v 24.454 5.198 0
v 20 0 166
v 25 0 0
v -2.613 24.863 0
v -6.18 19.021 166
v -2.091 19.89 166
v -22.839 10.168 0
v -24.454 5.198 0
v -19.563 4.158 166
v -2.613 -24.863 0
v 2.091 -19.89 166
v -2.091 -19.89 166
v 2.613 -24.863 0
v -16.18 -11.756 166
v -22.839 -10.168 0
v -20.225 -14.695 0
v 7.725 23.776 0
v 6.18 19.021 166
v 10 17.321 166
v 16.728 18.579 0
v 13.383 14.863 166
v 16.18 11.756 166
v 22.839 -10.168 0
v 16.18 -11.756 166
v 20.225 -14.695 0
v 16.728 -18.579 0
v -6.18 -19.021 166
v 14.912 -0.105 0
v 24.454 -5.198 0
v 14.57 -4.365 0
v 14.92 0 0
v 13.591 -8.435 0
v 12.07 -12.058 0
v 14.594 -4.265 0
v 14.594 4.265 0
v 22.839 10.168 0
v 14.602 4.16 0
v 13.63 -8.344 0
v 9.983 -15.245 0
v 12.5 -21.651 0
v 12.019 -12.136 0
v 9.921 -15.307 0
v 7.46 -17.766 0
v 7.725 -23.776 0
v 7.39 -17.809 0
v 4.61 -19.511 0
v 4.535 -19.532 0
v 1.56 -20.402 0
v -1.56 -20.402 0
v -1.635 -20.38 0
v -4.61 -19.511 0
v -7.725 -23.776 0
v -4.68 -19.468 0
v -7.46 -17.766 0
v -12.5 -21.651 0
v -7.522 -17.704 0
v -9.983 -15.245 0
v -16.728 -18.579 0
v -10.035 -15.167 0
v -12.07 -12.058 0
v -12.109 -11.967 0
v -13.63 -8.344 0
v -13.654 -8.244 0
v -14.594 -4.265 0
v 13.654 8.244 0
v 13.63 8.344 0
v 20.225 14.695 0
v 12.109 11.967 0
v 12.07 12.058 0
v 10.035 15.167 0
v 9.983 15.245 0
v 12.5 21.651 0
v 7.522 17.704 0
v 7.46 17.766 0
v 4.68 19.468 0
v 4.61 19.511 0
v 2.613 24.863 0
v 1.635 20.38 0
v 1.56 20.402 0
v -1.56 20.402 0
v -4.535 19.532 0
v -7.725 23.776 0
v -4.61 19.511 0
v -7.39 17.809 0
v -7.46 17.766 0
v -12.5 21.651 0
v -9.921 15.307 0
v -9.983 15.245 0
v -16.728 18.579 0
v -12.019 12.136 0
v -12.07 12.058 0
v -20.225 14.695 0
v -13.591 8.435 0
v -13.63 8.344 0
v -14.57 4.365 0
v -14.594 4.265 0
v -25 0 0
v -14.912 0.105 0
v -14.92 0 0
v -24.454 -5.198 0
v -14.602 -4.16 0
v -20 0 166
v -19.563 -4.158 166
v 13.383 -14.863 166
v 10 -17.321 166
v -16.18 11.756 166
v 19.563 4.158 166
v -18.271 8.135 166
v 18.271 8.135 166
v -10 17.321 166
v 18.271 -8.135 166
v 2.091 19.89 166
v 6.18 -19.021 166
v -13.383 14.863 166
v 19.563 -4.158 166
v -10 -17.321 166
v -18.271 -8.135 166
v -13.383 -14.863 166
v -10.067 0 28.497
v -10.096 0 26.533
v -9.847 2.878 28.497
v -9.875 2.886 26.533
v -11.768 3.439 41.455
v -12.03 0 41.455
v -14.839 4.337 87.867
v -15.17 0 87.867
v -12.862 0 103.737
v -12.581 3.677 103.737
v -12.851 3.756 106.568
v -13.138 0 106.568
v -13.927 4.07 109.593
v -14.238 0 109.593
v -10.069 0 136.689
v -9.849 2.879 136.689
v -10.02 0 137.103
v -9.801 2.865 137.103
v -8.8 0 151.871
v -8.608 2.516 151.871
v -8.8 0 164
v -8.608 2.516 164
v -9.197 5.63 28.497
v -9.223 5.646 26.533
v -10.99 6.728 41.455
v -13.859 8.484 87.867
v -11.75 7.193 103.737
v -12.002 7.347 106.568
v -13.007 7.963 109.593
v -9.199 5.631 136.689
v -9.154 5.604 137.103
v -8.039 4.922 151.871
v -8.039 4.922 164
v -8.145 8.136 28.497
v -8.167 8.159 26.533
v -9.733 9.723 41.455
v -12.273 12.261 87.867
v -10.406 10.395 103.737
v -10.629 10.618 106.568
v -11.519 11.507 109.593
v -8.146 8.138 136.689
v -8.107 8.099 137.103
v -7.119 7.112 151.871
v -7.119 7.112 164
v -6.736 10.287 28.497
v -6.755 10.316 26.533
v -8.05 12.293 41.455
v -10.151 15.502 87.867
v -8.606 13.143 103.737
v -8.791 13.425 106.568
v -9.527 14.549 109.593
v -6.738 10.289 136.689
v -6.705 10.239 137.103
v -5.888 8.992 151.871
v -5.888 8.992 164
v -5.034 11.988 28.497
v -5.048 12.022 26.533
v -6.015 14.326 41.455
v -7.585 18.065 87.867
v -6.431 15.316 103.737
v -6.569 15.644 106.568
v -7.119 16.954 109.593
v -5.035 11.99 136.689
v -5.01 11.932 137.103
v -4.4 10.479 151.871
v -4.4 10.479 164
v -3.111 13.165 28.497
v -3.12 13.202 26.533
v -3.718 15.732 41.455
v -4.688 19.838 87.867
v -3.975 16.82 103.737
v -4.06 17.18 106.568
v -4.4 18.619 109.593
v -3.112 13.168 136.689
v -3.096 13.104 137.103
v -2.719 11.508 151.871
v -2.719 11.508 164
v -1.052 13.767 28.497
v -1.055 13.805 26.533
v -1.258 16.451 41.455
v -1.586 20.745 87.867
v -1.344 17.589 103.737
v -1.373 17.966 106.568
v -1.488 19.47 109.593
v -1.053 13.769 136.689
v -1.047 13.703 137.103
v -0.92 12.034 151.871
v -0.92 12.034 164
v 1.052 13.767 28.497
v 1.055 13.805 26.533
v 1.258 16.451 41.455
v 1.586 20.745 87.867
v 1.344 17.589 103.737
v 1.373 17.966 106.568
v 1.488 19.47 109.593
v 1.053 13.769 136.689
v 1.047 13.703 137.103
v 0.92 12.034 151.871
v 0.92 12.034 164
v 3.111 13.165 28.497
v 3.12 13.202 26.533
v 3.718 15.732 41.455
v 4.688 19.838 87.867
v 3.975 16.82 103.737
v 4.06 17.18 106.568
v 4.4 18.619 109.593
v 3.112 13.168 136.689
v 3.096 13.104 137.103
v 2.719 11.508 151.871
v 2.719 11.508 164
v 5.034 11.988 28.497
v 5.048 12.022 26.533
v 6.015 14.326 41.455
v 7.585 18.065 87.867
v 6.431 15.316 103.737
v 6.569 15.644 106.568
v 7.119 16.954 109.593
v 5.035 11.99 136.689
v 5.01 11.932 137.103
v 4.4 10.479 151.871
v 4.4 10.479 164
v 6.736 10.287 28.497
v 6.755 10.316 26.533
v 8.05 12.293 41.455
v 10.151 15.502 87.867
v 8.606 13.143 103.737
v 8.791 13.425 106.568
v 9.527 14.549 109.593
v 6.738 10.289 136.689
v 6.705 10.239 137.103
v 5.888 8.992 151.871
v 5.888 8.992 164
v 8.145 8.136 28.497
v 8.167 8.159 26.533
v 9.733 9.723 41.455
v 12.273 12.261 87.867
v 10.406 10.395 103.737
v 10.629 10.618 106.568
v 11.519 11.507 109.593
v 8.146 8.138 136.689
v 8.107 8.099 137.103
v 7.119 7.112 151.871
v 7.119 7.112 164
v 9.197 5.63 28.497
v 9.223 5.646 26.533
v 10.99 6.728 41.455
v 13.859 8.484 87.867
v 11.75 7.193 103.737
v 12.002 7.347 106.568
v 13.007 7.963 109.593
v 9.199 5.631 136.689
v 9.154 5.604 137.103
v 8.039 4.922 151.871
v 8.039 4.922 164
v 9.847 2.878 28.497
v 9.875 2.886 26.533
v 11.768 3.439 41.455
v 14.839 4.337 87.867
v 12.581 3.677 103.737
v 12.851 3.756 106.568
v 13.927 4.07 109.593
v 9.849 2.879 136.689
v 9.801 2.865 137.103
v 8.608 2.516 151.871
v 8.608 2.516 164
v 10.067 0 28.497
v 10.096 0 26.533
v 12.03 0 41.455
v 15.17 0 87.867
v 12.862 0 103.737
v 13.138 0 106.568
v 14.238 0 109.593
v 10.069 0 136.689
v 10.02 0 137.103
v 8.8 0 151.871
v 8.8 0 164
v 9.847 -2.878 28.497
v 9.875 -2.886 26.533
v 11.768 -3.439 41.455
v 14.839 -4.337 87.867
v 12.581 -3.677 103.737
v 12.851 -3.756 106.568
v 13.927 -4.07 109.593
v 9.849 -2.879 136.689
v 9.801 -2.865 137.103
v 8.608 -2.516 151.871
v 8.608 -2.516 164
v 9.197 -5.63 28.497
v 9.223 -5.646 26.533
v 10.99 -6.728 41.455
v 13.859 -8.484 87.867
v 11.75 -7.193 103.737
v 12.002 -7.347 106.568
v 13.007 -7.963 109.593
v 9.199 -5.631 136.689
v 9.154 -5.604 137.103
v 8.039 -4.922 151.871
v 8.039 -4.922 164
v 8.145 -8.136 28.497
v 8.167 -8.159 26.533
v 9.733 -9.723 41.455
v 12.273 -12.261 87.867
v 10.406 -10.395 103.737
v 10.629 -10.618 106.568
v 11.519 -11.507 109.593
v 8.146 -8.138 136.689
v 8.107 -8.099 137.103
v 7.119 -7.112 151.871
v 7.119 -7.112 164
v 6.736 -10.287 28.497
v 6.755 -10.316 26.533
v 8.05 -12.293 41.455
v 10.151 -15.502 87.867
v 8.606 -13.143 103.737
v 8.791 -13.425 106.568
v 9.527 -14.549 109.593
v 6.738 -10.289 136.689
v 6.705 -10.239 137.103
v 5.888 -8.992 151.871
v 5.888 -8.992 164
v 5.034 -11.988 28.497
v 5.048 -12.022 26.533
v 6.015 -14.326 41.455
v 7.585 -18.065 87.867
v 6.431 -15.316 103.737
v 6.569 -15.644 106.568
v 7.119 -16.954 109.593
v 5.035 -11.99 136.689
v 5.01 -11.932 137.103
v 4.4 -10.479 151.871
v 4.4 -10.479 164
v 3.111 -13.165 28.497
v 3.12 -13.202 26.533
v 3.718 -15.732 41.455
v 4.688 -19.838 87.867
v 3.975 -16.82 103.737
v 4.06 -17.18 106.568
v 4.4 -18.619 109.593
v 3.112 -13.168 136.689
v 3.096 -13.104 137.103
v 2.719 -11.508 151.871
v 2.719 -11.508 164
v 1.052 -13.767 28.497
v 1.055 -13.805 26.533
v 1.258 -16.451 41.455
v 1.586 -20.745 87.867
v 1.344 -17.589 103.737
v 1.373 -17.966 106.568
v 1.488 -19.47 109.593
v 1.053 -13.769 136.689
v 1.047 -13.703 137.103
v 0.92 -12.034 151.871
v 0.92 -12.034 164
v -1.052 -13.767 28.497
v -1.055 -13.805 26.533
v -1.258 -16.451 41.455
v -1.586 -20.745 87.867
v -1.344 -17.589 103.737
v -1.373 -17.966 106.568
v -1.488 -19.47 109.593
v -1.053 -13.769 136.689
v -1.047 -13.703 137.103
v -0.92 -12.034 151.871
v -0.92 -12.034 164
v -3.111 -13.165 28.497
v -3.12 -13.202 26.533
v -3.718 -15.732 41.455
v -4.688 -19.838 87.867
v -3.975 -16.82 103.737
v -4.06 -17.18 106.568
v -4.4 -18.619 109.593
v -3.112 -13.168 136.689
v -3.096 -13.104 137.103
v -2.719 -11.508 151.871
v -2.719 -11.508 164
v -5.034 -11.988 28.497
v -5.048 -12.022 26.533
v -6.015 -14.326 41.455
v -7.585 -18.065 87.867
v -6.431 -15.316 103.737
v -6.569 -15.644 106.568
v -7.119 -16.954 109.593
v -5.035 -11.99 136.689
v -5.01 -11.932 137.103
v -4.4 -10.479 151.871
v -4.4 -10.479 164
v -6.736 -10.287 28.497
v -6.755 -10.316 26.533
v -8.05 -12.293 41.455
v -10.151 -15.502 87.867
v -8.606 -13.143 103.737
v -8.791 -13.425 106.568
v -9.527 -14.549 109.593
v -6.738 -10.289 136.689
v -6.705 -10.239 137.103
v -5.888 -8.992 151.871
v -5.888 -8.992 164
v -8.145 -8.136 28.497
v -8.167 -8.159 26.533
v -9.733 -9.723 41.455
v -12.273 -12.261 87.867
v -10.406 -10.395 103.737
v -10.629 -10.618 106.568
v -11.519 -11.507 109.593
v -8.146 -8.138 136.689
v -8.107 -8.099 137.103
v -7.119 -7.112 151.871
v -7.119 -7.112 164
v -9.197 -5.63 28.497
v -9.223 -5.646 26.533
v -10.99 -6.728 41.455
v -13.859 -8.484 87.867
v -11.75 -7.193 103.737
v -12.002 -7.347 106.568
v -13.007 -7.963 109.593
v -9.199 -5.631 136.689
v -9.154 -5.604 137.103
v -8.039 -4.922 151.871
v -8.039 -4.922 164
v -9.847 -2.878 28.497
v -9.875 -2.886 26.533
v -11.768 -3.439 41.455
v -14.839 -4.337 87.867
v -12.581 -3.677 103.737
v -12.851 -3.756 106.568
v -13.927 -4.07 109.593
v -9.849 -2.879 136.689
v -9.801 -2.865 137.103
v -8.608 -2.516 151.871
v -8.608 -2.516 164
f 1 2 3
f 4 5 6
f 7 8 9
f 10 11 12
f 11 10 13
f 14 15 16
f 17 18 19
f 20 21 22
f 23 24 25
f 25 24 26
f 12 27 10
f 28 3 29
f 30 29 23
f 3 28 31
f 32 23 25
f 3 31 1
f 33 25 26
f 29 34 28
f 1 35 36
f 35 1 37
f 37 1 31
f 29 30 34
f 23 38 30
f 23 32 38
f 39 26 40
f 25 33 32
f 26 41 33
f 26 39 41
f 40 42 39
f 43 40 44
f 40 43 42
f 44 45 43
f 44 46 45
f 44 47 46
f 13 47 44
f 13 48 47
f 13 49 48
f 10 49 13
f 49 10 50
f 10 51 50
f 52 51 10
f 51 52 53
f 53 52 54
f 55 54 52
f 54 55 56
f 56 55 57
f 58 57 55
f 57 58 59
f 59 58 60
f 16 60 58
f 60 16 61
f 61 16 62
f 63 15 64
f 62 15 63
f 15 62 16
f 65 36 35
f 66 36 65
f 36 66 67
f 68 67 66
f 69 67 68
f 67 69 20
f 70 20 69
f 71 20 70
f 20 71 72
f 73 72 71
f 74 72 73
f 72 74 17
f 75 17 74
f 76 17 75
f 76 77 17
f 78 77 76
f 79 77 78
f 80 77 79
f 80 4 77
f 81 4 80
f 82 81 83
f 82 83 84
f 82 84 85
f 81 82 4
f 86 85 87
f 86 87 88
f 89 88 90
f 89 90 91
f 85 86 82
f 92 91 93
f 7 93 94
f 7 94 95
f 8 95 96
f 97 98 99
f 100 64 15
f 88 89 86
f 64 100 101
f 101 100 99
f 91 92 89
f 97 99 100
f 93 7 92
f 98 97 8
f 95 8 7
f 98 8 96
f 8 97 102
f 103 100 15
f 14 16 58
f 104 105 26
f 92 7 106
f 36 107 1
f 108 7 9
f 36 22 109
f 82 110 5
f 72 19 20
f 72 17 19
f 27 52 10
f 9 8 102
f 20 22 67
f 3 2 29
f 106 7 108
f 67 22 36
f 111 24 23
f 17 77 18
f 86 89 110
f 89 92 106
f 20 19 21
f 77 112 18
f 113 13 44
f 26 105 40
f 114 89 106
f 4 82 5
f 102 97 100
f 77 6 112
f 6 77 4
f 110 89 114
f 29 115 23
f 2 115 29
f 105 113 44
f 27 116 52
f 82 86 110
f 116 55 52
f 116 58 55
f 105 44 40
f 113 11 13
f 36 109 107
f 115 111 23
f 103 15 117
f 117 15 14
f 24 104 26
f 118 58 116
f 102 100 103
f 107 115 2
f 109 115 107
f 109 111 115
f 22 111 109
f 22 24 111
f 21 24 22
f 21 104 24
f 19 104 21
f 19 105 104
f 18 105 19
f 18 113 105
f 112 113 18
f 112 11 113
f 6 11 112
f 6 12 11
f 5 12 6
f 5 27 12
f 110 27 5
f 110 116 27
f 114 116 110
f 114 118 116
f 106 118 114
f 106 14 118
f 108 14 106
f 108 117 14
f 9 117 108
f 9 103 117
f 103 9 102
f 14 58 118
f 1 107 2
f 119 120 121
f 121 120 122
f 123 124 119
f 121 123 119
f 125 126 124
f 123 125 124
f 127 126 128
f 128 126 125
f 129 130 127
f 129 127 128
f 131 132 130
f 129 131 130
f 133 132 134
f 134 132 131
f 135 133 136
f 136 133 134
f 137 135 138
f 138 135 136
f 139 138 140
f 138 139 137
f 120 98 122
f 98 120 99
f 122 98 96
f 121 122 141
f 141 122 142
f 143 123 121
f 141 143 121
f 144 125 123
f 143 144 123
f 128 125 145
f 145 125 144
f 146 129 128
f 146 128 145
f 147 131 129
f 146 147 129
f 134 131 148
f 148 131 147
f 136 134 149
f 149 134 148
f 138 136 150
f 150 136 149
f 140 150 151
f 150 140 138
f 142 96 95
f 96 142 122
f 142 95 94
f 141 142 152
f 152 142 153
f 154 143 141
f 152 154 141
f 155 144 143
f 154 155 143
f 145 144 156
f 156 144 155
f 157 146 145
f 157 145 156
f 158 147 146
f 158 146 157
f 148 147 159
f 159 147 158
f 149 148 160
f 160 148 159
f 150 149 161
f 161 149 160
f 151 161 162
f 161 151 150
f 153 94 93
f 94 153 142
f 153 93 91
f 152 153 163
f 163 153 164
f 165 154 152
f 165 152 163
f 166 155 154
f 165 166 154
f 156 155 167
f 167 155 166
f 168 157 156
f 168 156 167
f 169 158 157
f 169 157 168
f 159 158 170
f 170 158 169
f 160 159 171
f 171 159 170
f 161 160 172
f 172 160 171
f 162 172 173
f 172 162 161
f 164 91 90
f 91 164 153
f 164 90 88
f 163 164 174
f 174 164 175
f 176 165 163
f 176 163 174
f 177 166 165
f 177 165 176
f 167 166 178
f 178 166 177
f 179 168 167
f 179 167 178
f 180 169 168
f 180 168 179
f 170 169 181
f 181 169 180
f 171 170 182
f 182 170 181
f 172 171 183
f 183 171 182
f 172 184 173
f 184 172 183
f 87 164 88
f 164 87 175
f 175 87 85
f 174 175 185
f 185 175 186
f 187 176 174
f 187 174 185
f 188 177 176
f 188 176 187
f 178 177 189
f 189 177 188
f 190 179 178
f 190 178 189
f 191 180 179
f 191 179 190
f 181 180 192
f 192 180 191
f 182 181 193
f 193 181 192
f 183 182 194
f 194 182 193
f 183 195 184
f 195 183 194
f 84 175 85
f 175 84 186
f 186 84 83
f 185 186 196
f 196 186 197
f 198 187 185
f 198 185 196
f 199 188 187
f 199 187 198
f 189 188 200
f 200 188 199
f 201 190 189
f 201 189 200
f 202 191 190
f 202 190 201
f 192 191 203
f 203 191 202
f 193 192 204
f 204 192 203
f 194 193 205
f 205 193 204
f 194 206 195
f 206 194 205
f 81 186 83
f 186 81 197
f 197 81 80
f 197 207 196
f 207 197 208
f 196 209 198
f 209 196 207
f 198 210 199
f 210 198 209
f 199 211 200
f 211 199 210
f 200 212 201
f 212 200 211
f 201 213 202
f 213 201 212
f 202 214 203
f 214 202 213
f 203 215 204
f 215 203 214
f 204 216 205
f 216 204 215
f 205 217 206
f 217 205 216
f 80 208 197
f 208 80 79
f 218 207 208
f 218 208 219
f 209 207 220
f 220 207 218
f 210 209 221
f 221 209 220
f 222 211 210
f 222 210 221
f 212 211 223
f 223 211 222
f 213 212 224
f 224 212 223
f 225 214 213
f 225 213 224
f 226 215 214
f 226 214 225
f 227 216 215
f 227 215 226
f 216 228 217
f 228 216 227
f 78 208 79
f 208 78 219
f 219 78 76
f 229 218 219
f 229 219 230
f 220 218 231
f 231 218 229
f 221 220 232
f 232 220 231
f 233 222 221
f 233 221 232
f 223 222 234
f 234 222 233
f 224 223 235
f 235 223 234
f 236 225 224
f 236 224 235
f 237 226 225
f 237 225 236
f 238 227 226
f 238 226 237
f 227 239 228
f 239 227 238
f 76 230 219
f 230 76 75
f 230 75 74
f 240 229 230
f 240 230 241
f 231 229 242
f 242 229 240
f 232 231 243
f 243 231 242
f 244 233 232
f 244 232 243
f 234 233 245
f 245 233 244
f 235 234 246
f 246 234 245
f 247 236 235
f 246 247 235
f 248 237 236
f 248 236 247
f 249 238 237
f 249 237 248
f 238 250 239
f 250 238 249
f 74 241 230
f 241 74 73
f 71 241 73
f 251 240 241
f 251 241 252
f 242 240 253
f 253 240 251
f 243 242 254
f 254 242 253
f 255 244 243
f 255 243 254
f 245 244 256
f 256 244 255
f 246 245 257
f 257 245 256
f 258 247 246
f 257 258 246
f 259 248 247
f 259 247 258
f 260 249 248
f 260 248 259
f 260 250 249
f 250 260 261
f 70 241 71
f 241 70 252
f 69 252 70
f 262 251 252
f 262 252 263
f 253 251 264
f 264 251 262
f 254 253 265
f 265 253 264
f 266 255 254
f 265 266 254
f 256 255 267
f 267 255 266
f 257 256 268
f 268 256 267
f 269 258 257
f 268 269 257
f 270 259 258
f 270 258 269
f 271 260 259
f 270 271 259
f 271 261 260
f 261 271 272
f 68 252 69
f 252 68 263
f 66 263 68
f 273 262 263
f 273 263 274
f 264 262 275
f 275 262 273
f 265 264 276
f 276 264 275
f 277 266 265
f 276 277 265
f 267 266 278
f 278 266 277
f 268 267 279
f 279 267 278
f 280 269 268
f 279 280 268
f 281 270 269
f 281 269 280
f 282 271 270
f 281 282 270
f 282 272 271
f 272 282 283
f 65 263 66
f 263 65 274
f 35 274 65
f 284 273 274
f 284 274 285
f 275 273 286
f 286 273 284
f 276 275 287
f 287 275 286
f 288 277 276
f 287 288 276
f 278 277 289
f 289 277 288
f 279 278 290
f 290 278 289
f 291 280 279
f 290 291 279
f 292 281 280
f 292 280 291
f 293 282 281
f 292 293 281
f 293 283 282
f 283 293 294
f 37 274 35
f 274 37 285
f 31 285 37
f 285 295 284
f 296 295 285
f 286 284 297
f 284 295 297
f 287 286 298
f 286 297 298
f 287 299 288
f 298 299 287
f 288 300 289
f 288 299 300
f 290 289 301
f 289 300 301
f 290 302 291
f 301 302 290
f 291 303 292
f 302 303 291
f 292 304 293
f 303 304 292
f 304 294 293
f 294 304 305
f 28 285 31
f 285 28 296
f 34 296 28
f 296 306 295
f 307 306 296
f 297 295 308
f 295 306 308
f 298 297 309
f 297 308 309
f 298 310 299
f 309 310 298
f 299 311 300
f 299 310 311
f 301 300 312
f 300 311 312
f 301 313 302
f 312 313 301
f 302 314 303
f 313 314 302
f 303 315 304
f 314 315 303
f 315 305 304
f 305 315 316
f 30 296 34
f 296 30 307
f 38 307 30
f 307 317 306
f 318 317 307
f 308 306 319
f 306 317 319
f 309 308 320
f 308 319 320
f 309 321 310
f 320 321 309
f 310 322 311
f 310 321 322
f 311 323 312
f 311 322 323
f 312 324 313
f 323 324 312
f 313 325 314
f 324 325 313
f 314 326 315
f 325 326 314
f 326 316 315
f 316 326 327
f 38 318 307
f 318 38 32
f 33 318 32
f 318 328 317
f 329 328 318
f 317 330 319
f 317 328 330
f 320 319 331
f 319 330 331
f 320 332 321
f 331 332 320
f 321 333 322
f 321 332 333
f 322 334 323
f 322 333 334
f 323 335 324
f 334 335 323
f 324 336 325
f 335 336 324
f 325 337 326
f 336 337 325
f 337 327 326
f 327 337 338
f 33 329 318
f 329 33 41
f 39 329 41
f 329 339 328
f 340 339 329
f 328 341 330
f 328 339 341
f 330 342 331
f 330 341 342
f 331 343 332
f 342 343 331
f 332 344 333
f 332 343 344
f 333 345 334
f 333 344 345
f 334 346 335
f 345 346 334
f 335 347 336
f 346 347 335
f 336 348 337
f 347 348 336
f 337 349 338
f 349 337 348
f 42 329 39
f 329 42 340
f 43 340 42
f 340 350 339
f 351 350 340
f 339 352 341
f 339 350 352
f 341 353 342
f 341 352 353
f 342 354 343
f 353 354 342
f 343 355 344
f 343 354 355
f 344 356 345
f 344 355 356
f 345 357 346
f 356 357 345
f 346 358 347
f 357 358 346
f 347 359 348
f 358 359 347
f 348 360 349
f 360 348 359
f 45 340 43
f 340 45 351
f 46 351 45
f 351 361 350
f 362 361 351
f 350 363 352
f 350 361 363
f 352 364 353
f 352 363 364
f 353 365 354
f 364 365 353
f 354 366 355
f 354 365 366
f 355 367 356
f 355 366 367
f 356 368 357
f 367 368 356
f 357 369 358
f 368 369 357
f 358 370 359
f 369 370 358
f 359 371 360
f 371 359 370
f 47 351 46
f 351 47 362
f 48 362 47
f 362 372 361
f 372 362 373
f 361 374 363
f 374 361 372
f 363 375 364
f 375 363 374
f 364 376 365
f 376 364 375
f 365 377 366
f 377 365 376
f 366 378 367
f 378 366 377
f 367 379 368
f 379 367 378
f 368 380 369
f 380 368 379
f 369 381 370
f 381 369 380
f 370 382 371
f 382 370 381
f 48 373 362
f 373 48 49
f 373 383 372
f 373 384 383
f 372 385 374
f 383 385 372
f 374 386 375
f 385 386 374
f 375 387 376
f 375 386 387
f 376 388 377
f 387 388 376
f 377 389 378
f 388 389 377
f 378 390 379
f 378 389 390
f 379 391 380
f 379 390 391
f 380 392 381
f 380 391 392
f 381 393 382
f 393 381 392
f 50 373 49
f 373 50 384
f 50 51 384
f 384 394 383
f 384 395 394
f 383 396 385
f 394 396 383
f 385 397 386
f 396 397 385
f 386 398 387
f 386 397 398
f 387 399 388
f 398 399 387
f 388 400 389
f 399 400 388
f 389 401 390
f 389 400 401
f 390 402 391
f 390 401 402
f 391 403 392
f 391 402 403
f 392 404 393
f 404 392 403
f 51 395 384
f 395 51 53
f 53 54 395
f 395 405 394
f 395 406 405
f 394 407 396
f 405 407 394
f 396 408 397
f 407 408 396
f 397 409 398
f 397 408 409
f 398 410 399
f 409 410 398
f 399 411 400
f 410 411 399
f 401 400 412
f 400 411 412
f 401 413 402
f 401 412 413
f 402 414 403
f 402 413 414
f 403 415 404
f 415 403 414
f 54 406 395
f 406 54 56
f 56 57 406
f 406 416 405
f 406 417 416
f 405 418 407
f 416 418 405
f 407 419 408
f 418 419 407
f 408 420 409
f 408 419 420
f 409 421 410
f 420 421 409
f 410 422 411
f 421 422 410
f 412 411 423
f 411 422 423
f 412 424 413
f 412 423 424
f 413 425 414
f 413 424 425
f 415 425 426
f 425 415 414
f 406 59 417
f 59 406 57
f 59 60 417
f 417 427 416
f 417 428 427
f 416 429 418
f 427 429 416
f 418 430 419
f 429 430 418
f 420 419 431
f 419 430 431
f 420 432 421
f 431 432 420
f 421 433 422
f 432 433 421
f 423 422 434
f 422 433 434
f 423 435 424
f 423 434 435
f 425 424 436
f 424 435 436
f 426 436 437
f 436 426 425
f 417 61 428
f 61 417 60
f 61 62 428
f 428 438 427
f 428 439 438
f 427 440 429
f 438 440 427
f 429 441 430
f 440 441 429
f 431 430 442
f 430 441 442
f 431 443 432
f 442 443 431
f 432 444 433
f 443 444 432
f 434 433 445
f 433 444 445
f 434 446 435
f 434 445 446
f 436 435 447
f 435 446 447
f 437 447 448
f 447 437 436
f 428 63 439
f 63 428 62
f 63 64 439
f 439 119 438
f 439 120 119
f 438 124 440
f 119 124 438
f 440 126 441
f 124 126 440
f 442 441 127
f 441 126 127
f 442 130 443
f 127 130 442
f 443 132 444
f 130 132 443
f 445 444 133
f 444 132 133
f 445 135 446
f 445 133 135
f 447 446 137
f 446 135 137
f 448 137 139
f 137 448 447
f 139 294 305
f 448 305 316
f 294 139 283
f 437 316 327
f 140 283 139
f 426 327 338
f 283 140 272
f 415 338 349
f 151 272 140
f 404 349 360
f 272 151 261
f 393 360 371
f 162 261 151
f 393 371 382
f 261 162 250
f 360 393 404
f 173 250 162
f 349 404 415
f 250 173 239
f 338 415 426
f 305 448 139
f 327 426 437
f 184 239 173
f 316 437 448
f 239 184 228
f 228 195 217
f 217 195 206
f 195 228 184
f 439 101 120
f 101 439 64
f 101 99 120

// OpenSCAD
function profilePts() = [[0,0], [20,0], [12.5,30], [15, 42], [19,85], [16,100], [18,104], [12.5,130], [10, 152], [0,152]];

difference() {
    cylinder(h=166, d1=50, d2=40);
    translate([0,0,-1])
    scale ([0.8,1.1,1.1])
    rotate_extrude(){
        union(){
            square([11,150]);
            translate([4,-4])
            offset(r=-4)
            polygon(points=profilePts());
        }
    }
}
